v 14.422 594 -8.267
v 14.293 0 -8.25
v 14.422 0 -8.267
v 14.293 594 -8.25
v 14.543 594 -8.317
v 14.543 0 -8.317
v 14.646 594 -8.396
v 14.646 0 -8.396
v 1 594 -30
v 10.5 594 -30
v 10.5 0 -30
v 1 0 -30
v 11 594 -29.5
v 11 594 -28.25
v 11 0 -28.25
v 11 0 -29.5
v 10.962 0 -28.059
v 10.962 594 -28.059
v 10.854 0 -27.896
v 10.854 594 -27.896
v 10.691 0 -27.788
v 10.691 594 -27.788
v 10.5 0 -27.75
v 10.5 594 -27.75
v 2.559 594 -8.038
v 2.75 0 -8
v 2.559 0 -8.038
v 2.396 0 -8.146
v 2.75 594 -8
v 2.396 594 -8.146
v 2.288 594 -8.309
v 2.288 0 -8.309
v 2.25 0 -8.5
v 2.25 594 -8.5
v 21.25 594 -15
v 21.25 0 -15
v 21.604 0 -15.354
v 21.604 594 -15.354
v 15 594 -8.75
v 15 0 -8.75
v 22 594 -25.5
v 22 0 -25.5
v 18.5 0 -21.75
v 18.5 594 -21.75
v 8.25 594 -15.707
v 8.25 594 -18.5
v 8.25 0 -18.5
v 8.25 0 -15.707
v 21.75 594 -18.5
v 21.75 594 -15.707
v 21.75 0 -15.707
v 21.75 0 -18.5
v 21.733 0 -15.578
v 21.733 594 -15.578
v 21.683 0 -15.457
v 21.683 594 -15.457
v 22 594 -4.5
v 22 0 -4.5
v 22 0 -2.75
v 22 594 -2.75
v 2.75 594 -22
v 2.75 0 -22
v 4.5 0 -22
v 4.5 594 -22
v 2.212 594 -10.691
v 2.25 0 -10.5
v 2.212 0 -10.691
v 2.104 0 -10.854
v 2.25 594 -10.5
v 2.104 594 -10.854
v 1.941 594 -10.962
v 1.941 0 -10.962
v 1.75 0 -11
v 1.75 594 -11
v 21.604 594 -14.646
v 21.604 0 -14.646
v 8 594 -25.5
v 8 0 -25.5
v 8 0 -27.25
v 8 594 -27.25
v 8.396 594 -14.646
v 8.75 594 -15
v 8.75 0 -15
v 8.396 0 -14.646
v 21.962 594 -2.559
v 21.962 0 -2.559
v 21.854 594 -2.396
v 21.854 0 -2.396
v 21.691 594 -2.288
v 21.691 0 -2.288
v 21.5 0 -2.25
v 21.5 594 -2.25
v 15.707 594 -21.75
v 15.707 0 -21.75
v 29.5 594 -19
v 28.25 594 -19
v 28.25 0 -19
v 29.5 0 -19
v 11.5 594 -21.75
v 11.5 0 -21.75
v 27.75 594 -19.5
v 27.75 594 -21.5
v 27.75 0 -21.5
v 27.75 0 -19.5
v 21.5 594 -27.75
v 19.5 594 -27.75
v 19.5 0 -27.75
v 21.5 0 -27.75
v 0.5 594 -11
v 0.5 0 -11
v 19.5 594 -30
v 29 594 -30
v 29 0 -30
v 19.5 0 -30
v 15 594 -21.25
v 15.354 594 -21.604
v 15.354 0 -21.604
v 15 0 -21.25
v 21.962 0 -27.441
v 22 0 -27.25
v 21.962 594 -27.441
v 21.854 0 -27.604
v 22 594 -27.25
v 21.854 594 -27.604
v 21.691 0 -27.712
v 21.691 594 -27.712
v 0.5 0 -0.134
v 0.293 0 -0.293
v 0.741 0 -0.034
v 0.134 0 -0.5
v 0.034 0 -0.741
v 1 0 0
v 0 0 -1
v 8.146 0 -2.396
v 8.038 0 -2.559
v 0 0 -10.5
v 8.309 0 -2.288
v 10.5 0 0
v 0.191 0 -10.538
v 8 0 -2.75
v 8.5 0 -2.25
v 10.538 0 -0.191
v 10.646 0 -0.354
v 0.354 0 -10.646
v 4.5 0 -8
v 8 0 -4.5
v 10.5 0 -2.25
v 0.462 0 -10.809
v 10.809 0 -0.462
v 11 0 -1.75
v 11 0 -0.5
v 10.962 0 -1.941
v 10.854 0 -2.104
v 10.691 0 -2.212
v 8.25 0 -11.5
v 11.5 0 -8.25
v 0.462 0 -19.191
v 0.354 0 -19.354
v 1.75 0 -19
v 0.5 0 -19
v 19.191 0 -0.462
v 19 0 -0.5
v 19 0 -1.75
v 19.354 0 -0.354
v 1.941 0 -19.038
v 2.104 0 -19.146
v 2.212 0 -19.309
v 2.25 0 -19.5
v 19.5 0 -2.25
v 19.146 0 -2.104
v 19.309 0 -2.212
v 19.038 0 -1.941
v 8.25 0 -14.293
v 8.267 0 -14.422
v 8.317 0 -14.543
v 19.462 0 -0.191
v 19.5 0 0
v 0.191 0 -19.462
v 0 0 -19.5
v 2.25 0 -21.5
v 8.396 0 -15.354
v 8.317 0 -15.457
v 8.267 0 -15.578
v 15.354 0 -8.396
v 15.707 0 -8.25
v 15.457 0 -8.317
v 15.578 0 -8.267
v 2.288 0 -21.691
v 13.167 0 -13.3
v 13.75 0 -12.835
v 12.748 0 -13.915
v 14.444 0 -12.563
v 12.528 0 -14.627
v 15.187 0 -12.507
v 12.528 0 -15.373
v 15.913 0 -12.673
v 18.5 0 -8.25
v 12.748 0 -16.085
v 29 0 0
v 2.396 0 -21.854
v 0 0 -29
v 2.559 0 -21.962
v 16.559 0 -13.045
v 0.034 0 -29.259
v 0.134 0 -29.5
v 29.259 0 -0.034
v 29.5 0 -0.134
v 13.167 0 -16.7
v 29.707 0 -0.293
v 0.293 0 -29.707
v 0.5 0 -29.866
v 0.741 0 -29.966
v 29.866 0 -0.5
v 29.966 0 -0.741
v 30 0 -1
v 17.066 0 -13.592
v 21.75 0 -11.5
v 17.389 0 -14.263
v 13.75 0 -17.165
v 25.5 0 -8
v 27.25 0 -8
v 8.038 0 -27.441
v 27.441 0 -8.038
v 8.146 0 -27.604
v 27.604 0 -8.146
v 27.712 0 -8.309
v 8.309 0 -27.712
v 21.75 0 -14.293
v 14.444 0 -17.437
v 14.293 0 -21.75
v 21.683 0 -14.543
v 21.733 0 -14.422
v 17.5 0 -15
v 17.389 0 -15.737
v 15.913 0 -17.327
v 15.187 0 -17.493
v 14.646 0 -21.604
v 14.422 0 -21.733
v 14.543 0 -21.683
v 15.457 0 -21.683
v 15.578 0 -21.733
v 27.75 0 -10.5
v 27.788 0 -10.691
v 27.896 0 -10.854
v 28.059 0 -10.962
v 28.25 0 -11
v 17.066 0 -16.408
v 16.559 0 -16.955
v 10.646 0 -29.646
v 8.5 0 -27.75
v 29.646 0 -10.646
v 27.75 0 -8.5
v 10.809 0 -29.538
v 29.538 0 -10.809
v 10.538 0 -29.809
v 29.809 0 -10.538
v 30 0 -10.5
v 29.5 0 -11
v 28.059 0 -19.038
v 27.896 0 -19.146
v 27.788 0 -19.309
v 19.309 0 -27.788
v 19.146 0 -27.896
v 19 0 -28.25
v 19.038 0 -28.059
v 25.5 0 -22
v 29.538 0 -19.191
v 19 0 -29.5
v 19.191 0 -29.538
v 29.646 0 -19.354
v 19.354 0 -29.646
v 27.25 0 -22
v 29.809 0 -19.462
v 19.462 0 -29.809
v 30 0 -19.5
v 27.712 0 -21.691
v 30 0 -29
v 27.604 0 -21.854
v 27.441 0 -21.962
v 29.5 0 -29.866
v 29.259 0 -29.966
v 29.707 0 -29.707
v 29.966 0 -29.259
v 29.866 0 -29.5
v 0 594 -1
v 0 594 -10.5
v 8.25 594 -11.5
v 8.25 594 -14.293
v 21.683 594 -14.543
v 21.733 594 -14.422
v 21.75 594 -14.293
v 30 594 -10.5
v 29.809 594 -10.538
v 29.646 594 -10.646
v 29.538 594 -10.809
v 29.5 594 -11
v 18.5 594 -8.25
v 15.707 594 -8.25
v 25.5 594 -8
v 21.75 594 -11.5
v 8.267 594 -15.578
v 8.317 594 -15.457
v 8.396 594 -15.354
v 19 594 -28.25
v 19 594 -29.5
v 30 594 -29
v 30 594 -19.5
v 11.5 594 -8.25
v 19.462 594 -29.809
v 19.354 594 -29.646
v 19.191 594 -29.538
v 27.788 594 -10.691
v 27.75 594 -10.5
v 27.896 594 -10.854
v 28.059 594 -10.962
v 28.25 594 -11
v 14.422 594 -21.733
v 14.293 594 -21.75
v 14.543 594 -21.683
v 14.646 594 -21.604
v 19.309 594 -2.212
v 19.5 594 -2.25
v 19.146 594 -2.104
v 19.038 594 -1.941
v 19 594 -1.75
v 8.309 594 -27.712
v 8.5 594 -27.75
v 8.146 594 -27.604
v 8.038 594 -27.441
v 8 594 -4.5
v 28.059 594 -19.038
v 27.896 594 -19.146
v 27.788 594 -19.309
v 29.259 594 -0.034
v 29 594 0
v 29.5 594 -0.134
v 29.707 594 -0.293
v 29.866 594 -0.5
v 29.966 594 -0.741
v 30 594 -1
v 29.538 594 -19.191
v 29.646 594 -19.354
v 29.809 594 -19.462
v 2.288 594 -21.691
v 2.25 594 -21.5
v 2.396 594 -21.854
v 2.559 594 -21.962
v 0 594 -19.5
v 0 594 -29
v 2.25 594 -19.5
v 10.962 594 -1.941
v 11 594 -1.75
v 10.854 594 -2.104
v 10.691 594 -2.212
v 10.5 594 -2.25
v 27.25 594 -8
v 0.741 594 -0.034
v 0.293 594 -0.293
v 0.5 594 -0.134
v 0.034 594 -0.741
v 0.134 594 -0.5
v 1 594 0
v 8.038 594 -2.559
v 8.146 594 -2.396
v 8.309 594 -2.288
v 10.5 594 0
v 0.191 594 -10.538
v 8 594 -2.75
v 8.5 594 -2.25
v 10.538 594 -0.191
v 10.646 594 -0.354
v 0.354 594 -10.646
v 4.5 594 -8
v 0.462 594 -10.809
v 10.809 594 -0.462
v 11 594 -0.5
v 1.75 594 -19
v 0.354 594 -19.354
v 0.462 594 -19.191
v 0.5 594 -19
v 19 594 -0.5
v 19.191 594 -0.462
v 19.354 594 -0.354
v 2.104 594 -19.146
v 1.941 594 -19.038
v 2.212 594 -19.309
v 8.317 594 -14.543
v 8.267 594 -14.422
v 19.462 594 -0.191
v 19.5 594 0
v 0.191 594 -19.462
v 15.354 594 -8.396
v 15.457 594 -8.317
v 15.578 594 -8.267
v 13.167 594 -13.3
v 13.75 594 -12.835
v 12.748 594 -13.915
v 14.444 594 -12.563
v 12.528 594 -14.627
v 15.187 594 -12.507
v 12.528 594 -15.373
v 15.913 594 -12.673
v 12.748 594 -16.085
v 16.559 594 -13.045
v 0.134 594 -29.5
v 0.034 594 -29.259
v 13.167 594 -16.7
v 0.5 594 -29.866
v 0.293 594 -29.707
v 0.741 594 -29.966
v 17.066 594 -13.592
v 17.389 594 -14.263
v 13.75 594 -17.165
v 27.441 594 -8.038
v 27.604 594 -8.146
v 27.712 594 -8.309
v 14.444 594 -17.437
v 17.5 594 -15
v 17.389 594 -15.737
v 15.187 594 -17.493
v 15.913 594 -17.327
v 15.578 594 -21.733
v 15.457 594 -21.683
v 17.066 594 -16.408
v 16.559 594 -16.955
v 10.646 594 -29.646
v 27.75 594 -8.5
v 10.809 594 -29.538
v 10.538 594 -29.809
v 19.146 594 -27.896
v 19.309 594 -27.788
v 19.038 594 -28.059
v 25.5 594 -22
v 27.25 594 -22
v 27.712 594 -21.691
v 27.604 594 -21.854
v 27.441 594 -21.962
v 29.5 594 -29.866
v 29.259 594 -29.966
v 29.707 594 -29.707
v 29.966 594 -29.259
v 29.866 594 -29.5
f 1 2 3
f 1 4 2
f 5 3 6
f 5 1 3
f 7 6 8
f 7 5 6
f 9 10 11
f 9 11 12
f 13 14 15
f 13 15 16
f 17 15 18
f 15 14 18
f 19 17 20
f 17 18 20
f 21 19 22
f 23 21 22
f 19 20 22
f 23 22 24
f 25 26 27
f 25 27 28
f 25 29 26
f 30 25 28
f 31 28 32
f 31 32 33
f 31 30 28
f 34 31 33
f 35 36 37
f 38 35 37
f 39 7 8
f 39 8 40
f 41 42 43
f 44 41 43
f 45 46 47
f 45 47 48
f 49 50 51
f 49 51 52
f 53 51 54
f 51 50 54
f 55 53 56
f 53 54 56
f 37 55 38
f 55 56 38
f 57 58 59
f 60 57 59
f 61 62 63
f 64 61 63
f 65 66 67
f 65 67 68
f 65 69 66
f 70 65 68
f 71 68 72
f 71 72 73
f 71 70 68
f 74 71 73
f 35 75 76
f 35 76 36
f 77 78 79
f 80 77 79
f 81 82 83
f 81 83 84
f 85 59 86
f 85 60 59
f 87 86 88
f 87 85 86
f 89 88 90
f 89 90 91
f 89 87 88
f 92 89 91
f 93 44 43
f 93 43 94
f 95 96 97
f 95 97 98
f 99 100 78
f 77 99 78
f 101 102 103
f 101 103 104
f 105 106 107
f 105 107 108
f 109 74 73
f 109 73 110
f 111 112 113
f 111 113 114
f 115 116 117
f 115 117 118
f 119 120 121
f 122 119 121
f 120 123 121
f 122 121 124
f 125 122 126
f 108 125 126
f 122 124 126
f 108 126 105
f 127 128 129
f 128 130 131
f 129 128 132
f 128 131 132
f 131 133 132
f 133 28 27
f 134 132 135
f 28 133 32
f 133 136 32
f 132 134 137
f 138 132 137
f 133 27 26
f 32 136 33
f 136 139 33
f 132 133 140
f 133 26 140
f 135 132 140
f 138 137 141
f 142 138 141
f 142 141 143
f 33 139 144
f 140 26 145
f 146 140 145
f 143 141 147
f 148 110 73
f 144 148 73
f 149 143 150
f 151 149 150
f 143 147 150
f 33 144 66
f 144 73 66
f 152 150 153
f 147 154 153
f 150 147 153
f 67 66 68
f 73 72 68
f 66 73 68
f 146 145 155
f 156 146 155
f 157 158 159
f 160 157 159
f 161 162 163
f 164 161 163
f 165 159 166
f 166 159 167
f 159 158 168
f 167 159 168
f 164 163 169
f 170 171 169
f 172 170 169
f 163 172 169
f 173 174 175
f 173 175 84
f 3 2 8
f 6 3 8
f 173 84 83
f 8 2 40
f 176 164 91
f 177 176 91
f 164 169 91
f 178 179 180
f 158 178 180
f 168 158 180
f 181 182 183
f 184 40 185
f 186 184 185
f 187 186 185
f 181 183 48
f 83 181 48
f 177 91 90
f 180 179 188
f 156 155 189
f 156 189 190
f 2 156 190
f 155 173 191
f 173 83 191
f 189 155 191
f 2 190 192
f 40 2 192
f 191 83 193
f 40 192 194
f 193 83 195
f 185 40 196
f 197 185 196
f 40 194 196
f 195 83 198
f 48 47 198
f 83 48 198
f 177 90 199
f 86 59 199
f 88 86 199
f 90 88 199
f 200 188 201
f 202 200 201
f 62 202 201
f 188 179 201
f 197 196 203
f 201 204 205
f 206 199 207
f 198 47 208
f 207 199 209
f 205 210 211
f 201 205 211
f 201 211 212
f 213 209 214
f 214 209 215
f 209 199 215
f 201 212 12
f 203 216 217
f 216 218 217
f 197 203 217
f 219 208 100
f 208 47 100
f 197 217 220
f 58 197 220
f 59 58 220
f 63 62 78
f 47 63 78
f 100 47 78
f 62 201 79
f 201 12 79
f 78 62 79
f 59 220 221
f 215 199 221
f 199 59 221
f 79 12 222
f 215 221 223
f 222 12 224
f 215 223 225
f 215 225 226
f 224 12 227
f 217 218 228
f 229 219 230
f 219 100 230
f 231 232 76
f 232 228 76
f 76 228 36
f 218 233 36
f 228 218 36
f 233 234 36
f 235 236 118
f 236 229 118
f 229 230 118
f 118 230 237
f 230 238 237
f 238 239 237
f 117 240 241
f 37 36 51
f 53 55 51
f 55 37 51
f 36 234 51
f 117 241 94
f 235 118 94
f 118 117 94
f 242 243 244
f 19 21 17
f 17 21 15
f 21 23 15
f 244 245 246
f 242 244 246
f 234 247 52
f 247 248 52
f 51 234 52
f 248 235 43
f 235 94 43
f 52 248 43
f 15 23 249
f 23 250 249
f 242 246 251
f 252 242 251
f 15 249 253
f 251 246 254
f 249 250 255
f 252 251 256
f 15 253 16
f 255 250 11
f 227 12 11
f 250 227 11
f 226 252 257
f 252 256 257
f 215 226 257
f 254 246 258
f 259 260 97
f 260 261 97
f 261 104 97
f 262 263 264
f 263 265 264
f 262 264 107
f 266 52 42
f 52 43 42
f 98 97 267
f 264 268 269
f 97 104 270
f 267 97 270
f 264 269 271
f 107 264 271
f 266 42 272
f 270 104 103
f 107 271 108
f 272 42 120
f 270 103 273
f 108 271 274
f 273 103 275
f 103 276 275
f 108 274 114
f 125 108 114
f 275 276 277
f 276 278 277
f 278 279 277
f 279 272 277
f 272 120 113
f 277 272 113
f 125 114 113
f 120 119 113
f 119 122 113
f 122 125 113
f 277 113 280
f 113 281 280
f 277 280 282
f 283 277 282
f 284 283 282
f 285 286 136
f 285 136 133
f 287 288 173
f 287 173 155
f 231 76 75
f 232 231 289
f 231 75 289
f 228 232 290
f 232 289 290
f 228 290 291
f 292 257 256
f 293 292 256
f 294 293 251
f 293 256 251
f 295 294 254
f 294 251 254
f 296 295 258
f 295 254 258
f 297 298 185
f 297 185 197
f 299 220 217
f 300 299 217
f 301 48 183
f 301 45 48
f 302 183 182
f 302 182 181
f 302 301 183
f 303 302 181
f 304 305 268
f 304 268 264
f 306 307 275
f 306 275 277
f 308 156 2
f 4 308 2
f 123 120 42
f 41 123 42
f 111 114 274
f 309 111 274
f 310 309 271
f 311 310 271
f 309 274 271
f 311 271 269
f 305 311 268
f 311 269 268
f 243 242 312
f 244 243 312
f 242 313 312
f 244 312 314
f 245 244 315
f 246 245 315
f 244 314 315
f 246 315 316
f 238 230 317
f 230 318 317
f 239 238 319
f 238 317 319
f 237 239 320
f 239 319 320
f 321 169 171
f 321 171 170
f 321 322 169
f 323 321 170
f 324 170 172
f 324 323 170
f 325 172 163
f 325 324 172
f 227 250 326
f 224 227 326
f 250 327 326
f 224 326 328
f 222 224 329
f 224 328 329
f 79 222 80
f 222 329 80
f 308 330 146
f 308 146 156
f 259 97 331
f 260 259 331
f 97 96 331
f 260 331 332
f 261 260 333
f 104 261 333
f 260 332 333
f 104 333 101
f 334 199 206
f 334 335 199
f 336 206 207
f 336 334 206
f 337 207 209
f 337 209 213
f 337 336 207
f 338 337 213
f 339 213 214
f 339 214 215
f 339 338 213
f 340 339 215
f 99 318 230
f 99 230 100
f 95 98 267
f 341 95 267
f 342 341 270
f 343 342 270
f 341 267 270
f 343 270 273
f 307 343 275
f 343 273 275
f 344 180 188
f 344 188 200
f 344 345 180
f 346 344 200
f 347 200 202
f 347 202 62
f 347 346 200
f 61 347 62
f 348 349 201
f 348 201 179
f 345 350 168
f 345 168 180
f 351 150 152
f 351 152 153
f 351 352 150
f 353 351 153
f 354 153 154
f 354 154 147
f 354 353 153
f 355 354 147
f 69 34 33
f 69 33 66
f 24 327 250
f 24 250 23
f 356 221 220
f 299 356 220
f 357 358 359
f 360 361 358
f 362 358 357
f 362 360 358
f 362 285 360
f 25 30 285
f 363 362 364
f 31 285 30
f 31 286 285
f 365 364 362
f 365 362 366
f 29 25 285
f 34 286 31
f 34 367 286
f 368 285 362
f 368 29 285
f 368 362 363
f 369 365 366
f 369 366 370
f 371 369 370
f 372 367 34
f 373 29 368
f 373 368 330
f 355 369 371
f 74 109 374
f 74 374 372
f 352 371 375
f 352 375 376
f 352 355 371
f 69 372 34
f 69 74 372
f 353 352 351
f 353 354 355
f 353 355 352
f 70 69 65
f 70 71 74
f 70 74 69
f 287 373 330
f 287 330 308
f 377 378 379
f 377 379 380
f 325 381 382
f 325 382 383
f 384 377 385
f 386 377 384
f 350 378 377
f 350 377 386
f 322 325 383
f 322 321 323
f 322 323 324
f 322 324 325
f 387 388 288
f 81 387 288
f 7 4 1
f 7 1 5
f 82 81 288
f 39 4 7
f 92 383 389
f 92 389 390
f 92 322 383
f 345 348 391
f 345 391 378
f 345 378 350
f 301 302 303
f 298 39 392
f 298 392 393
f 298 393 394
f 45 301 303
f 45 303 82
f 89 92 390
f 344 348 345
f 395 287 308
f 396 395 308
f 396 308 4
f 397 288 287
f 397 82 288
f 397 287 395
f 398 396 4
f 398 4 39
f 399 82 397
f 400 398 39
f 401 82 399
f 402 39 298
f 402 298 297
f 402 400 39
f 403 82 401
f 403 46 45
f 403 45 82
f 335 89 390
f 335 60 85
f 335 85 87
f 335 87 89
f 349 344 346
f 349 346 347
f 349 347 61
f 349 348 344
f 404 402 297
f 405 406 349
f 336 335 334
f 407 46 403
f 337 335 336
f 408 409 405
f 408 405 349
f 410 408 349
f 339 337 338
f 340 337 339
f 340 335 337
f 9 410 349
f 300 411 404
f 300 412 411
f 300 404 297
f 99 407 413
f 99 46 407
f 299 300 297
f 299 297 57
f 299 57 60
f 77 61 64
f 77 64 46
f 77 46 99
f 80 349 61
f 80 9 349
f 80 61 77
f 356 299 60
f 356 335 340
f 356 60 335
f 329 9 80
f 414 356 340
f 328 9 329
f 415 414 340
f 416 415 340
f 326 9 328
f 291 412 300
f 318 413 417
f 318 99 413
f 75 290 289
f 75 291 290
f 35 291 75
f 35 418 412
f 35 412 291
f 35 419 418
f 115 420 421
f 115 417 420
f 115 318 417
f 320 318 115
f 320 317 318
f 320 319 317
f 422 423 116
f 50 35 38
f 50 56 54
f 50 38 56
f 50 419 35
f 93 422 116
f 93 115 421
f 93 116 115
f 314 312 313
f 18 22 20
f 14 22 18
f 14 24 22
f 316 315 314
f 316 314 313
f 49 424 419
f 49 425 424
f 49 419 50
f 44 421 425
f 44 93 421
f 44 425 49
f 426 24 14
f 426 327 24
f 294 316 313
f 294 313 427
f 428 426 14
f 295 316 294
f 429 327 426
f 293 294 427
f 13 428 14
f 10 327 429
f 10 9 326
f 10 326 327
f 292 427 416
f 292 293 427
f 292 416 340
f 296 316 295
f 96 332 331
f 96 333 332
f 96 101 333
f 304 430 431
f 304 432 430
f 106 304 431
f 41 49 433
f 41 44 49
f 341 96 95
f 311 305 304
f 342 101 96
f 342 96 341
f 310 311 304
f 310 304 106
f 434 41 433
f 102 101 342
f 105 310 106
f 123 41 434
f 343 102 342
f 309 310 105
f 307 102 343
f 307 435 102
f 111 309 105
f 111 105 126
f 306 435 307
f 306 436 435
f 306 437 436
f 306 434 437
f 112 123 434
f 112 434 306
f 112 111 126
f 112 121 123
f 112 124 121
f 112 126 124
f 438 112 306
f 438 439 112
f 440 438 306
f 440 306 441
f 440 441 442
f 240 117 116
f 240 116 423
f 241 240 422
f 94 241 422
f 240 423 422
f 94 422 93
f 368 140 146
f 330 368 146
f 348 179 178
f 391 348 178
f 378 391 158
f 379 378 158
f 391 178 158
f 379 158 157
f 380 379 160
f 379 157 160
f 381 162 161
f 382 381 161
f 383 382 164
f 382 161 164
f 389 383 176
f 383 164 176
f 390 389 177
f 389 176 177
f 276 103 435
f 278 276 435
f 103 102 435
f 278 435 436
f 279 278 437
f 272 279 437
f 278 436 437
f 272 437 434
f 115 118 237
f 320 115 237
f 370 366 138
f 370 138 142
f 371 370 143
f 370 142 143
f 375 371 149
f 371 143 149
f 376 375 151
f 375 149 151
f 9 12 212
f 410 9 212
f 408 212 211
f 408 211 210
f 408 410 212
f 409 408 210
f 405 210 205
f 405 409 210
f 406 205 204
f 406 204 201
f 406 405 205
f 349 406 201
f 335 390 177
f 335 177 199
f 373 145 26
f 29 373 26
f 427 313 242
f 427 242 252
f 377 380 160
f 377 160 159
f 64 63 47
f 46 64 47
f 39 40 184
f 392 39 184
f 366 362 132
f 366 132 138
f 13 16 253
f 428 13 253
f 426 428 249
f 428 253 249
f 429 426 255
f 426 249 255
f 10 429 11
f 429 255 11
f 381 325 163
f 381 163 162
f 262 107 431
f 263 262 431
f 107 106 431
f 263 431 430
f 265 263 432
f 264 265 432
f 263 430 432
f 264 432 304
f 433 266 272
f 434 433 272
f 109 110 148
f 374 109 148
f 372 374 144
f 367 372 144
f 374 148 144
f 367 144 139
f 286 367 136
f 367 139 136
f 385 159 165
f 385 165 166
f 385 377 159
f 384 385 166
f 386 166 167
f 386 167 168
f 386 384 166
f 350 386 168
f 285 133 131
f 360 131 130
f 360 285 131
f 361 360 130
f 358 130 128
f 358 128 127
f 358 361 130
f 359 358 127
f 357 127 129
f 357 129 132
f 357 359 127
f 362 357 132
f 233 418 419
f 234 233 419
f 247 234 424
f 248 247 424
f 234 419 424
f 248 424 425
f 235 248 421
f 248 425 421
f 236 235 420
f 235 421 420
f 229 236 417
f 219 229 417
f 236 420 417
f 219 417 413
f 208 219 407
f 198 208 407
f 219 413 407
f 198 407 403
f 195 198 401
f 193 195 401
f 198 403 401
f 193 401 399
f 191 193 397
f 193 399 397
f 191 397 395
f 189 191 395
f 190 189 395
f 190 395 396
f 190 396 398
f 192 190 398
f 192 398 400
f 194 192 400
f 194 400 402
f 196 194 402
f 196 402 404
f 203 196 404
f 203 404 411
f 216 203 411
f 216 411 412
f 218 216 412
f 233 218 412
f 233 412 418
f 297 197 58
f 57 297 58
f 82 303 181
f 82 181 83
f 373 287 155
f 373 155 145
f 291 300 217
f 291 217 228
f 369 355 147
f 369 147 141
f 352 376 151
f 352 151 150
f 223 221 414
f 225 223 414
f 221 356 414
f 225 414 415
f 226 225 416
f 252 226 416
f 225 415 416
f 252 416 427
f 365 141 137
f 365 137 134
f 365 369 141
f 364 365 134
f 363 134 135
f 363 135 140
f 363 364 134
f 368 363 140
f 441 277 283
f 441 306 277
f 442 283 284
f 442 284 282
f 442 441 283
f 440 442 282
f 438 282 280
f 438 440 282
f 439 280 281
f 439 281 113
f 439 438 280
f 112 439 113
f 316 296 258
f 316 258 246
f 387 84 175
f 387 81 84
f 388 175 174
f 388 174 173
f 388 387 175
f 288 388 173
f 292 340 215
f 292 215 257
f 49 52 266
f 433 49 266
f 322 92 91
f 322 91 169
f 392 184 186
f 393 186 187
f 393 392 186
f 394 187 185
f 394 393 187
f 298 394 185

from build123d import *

# Parameters (mm, degrees)
BOSS_EXTRUDE1_DEPTH = 594
FILLET1_R           = 1
SKETCH4_R           = 2.5
CUT_EXTRUDE1_DEPTH  = 595
FILLET2_R           = 0.5


with BuildPart() as part:
    # Sketch3 → Boss-Extrude1 (new body)
    with BuildSketch(Plane(origin=(0, 0, 0), x_dir=(1, 0, 0), z_dir=(0, 1, 0))):
        with BuildLine():
            Line((11, 27.75), (11, 29.5))
            ThreePointArc((11, 29.5), (10.646446609, 29.646446609), (10.5, 30))
            Line((10.5, 30), (0, 30))
            Line((0, 30), (0, 19.5))
            ThreePointArc((0, 19.5), (0.353553391, 19.353553391), (0.5, 19))
            Line((0.5, 19), (2.25, 19))
            Line((2.25, 19), (2.25, 22))
            Line((2.25, 22), (4.5, 22))
            Line((4.5, 22), (8.25, 18.5))
            Line((8.25, 18.5), (8.25, 15.5))
            Line((8.25, 15.5), (8.75, 15))
            Line((8.75, 15), (8.25, 14.5))
            Line((8.25, 14.5), (8.25, 11.5))
            Line((8.25, 11.5), (4.5, 8))
            Line((4.5, 8), (2.25, 8))
            Line((2.25, 8), (2.25, 11))
            Line((2.25, 11), (0.5, 11))
            ThreePointArc((0.5, 11), (0.353553391, 10.646446609), (0, 10.5))
            Line((0, 10.5), (0, 0))
            Line((0, 0), (10.5, 0))
            ThreePointArc((10.5, 0), (10.646446609, 0.353553391), (11, 0.5))
            Line((11, 0.5), (11, 2.25))
            Line((11, 2.25), (8, 2.25))
            Line((8, 2.25), (8, 4.5))
            Line((8, 4.5), (11.5, 8.25))
            Line((11.5, 8.25), (14.5, 8.25))
            Line((14.5, 8.25), (15, 8.75))
            Line((15, 8.75), (15.5, 8.25))
            Line((15.5, 8.25), (18.5, 8.25))
            Line((18.5, 8.25), (22, 4.5))
            Line((22, 4.5), (22, 2.25))
            Line((22, 2.25), (19, 2.25))
            Line((19, 2.25), (19, 0.5))
            ThreePointArc((19, 0.5), (19.353553391, 0.353553391), (19.5, 0))
            Line((19.5, 0), (30, 0))
            Line((30, 0), (30, 10.5))
            ThreePointArc((30, 10.5), (29.646446609, 10.646446609), (29.5, 11))
            Line((29.5, 11), (27.75, 11))
            Line((27.75, 11), (27.75, 8))
            Line((27.75, 8), (25.5, 8))
            Line((25.5, 8), (21.75, 11.5))
            Line((21.75, 11.5), (21.75, 14.5))
            Line((21.75, 14.5), (21.25, 15))
            Line((21.25, 15), (21.75, 15.5))
            Line((21.75, 15.5), (21.75, 18.5))
            Line((21.75, 18.5), (25.5, 22))
            Line((25.5, 22), (27.75, 22))
            Line((27.75, 22), (27.75, 19))
            Line((27.75, 19), (29.5, 19))
            ThreePointArc((29.5, 19), (29.646446609, 19.353553391), (30, 19.5))
            Line((30, 19.5), (30, 30))
            Line((30, 30), (19.5, 30))
            ThreePointArc((19.5, 30), (19.353553391, 29.646446609), (19, 29.5))
            Line((19, 29.5), (19, 27.75))
            Line((19, 27.75), (22, 27.75))
            Line((22, 27.75), (22, 25.5))
            Line((22, 25.5), (18.5, 21.75))
            Line((18.5, 21.75), (15.5, 21.75))
            Line((15.5, 21.75), (15, 21.25))
            Line((15, 21.25), (14.5, 21.75))
            Line((14.5, 21.75), (11.5, 21.75))
            Line((11.5, 21.75), (8, 25.5))
            Line((8, 25.5), (8, 27.75))
            Line((8, 27.75), (11, 27.75))
        make_face()
    extrude(amount=BOSS_EXTRUDE1_DEPTH)

    # Fillet1
    fillet1_edges = [part.edges().sort_by_distance(p)[0] for p in [
        (30, 297, 0),
        (0, 297, 0),
        (0, 297, -30),
        (30, 297, -30),
    ]]
    fillet(fillet1_edges, radius=FILLET1_R)

    # Sketch4 → Cut-Extrude1 (cut, through all)
    with BuildSketch(Plane(origin=(0, 594, 0), x_dir=(1, 0, 0), z_dir=(0, 1, 0))):
        with Locations((15, 15)):
            Circle(SKETCH4_R)
    extrude(amount=-CUT_EXTRUDE1_DEPTH, mode=Mode.SUBTRACT)

    # Fillet2
    fillet2_edges = [part.edges().sort_by_distance(p)[0] for p in [
        (27.75, 297, -19),
        (27.75, 297, -22),
        (21.75, 297, -15.5),
        (21.75, 297, -14.5),
        (27.75, 297, -8),
        (27.75, 297, -11),
        (19, 297, -2.25),
        (22, 297, -2.25),
        (15.5, 297, -8.25),
        (14.5, 297, -8.25),
        (8, 297, -2.25),
        (11, 297, -2.25),
        (2.25, 297, -11),
        (2.25, 297, -8),
        (8.25, 297, -14.5),
        (8.25, 297, -15.5),
        (2.25, 297, -22),
        (2.25, 297, -19),
        (11, 297, -27.75),
        (8, 297, -27.75),
        (14.5, 297, -21.75),
        (15.5, 297, -21.75),
        (22, 297, -27.75),
        (19, 297, -27.75),
    ]]
    fillet(fillet2_edges, radius=FILLET2_R)


solid = part.part
